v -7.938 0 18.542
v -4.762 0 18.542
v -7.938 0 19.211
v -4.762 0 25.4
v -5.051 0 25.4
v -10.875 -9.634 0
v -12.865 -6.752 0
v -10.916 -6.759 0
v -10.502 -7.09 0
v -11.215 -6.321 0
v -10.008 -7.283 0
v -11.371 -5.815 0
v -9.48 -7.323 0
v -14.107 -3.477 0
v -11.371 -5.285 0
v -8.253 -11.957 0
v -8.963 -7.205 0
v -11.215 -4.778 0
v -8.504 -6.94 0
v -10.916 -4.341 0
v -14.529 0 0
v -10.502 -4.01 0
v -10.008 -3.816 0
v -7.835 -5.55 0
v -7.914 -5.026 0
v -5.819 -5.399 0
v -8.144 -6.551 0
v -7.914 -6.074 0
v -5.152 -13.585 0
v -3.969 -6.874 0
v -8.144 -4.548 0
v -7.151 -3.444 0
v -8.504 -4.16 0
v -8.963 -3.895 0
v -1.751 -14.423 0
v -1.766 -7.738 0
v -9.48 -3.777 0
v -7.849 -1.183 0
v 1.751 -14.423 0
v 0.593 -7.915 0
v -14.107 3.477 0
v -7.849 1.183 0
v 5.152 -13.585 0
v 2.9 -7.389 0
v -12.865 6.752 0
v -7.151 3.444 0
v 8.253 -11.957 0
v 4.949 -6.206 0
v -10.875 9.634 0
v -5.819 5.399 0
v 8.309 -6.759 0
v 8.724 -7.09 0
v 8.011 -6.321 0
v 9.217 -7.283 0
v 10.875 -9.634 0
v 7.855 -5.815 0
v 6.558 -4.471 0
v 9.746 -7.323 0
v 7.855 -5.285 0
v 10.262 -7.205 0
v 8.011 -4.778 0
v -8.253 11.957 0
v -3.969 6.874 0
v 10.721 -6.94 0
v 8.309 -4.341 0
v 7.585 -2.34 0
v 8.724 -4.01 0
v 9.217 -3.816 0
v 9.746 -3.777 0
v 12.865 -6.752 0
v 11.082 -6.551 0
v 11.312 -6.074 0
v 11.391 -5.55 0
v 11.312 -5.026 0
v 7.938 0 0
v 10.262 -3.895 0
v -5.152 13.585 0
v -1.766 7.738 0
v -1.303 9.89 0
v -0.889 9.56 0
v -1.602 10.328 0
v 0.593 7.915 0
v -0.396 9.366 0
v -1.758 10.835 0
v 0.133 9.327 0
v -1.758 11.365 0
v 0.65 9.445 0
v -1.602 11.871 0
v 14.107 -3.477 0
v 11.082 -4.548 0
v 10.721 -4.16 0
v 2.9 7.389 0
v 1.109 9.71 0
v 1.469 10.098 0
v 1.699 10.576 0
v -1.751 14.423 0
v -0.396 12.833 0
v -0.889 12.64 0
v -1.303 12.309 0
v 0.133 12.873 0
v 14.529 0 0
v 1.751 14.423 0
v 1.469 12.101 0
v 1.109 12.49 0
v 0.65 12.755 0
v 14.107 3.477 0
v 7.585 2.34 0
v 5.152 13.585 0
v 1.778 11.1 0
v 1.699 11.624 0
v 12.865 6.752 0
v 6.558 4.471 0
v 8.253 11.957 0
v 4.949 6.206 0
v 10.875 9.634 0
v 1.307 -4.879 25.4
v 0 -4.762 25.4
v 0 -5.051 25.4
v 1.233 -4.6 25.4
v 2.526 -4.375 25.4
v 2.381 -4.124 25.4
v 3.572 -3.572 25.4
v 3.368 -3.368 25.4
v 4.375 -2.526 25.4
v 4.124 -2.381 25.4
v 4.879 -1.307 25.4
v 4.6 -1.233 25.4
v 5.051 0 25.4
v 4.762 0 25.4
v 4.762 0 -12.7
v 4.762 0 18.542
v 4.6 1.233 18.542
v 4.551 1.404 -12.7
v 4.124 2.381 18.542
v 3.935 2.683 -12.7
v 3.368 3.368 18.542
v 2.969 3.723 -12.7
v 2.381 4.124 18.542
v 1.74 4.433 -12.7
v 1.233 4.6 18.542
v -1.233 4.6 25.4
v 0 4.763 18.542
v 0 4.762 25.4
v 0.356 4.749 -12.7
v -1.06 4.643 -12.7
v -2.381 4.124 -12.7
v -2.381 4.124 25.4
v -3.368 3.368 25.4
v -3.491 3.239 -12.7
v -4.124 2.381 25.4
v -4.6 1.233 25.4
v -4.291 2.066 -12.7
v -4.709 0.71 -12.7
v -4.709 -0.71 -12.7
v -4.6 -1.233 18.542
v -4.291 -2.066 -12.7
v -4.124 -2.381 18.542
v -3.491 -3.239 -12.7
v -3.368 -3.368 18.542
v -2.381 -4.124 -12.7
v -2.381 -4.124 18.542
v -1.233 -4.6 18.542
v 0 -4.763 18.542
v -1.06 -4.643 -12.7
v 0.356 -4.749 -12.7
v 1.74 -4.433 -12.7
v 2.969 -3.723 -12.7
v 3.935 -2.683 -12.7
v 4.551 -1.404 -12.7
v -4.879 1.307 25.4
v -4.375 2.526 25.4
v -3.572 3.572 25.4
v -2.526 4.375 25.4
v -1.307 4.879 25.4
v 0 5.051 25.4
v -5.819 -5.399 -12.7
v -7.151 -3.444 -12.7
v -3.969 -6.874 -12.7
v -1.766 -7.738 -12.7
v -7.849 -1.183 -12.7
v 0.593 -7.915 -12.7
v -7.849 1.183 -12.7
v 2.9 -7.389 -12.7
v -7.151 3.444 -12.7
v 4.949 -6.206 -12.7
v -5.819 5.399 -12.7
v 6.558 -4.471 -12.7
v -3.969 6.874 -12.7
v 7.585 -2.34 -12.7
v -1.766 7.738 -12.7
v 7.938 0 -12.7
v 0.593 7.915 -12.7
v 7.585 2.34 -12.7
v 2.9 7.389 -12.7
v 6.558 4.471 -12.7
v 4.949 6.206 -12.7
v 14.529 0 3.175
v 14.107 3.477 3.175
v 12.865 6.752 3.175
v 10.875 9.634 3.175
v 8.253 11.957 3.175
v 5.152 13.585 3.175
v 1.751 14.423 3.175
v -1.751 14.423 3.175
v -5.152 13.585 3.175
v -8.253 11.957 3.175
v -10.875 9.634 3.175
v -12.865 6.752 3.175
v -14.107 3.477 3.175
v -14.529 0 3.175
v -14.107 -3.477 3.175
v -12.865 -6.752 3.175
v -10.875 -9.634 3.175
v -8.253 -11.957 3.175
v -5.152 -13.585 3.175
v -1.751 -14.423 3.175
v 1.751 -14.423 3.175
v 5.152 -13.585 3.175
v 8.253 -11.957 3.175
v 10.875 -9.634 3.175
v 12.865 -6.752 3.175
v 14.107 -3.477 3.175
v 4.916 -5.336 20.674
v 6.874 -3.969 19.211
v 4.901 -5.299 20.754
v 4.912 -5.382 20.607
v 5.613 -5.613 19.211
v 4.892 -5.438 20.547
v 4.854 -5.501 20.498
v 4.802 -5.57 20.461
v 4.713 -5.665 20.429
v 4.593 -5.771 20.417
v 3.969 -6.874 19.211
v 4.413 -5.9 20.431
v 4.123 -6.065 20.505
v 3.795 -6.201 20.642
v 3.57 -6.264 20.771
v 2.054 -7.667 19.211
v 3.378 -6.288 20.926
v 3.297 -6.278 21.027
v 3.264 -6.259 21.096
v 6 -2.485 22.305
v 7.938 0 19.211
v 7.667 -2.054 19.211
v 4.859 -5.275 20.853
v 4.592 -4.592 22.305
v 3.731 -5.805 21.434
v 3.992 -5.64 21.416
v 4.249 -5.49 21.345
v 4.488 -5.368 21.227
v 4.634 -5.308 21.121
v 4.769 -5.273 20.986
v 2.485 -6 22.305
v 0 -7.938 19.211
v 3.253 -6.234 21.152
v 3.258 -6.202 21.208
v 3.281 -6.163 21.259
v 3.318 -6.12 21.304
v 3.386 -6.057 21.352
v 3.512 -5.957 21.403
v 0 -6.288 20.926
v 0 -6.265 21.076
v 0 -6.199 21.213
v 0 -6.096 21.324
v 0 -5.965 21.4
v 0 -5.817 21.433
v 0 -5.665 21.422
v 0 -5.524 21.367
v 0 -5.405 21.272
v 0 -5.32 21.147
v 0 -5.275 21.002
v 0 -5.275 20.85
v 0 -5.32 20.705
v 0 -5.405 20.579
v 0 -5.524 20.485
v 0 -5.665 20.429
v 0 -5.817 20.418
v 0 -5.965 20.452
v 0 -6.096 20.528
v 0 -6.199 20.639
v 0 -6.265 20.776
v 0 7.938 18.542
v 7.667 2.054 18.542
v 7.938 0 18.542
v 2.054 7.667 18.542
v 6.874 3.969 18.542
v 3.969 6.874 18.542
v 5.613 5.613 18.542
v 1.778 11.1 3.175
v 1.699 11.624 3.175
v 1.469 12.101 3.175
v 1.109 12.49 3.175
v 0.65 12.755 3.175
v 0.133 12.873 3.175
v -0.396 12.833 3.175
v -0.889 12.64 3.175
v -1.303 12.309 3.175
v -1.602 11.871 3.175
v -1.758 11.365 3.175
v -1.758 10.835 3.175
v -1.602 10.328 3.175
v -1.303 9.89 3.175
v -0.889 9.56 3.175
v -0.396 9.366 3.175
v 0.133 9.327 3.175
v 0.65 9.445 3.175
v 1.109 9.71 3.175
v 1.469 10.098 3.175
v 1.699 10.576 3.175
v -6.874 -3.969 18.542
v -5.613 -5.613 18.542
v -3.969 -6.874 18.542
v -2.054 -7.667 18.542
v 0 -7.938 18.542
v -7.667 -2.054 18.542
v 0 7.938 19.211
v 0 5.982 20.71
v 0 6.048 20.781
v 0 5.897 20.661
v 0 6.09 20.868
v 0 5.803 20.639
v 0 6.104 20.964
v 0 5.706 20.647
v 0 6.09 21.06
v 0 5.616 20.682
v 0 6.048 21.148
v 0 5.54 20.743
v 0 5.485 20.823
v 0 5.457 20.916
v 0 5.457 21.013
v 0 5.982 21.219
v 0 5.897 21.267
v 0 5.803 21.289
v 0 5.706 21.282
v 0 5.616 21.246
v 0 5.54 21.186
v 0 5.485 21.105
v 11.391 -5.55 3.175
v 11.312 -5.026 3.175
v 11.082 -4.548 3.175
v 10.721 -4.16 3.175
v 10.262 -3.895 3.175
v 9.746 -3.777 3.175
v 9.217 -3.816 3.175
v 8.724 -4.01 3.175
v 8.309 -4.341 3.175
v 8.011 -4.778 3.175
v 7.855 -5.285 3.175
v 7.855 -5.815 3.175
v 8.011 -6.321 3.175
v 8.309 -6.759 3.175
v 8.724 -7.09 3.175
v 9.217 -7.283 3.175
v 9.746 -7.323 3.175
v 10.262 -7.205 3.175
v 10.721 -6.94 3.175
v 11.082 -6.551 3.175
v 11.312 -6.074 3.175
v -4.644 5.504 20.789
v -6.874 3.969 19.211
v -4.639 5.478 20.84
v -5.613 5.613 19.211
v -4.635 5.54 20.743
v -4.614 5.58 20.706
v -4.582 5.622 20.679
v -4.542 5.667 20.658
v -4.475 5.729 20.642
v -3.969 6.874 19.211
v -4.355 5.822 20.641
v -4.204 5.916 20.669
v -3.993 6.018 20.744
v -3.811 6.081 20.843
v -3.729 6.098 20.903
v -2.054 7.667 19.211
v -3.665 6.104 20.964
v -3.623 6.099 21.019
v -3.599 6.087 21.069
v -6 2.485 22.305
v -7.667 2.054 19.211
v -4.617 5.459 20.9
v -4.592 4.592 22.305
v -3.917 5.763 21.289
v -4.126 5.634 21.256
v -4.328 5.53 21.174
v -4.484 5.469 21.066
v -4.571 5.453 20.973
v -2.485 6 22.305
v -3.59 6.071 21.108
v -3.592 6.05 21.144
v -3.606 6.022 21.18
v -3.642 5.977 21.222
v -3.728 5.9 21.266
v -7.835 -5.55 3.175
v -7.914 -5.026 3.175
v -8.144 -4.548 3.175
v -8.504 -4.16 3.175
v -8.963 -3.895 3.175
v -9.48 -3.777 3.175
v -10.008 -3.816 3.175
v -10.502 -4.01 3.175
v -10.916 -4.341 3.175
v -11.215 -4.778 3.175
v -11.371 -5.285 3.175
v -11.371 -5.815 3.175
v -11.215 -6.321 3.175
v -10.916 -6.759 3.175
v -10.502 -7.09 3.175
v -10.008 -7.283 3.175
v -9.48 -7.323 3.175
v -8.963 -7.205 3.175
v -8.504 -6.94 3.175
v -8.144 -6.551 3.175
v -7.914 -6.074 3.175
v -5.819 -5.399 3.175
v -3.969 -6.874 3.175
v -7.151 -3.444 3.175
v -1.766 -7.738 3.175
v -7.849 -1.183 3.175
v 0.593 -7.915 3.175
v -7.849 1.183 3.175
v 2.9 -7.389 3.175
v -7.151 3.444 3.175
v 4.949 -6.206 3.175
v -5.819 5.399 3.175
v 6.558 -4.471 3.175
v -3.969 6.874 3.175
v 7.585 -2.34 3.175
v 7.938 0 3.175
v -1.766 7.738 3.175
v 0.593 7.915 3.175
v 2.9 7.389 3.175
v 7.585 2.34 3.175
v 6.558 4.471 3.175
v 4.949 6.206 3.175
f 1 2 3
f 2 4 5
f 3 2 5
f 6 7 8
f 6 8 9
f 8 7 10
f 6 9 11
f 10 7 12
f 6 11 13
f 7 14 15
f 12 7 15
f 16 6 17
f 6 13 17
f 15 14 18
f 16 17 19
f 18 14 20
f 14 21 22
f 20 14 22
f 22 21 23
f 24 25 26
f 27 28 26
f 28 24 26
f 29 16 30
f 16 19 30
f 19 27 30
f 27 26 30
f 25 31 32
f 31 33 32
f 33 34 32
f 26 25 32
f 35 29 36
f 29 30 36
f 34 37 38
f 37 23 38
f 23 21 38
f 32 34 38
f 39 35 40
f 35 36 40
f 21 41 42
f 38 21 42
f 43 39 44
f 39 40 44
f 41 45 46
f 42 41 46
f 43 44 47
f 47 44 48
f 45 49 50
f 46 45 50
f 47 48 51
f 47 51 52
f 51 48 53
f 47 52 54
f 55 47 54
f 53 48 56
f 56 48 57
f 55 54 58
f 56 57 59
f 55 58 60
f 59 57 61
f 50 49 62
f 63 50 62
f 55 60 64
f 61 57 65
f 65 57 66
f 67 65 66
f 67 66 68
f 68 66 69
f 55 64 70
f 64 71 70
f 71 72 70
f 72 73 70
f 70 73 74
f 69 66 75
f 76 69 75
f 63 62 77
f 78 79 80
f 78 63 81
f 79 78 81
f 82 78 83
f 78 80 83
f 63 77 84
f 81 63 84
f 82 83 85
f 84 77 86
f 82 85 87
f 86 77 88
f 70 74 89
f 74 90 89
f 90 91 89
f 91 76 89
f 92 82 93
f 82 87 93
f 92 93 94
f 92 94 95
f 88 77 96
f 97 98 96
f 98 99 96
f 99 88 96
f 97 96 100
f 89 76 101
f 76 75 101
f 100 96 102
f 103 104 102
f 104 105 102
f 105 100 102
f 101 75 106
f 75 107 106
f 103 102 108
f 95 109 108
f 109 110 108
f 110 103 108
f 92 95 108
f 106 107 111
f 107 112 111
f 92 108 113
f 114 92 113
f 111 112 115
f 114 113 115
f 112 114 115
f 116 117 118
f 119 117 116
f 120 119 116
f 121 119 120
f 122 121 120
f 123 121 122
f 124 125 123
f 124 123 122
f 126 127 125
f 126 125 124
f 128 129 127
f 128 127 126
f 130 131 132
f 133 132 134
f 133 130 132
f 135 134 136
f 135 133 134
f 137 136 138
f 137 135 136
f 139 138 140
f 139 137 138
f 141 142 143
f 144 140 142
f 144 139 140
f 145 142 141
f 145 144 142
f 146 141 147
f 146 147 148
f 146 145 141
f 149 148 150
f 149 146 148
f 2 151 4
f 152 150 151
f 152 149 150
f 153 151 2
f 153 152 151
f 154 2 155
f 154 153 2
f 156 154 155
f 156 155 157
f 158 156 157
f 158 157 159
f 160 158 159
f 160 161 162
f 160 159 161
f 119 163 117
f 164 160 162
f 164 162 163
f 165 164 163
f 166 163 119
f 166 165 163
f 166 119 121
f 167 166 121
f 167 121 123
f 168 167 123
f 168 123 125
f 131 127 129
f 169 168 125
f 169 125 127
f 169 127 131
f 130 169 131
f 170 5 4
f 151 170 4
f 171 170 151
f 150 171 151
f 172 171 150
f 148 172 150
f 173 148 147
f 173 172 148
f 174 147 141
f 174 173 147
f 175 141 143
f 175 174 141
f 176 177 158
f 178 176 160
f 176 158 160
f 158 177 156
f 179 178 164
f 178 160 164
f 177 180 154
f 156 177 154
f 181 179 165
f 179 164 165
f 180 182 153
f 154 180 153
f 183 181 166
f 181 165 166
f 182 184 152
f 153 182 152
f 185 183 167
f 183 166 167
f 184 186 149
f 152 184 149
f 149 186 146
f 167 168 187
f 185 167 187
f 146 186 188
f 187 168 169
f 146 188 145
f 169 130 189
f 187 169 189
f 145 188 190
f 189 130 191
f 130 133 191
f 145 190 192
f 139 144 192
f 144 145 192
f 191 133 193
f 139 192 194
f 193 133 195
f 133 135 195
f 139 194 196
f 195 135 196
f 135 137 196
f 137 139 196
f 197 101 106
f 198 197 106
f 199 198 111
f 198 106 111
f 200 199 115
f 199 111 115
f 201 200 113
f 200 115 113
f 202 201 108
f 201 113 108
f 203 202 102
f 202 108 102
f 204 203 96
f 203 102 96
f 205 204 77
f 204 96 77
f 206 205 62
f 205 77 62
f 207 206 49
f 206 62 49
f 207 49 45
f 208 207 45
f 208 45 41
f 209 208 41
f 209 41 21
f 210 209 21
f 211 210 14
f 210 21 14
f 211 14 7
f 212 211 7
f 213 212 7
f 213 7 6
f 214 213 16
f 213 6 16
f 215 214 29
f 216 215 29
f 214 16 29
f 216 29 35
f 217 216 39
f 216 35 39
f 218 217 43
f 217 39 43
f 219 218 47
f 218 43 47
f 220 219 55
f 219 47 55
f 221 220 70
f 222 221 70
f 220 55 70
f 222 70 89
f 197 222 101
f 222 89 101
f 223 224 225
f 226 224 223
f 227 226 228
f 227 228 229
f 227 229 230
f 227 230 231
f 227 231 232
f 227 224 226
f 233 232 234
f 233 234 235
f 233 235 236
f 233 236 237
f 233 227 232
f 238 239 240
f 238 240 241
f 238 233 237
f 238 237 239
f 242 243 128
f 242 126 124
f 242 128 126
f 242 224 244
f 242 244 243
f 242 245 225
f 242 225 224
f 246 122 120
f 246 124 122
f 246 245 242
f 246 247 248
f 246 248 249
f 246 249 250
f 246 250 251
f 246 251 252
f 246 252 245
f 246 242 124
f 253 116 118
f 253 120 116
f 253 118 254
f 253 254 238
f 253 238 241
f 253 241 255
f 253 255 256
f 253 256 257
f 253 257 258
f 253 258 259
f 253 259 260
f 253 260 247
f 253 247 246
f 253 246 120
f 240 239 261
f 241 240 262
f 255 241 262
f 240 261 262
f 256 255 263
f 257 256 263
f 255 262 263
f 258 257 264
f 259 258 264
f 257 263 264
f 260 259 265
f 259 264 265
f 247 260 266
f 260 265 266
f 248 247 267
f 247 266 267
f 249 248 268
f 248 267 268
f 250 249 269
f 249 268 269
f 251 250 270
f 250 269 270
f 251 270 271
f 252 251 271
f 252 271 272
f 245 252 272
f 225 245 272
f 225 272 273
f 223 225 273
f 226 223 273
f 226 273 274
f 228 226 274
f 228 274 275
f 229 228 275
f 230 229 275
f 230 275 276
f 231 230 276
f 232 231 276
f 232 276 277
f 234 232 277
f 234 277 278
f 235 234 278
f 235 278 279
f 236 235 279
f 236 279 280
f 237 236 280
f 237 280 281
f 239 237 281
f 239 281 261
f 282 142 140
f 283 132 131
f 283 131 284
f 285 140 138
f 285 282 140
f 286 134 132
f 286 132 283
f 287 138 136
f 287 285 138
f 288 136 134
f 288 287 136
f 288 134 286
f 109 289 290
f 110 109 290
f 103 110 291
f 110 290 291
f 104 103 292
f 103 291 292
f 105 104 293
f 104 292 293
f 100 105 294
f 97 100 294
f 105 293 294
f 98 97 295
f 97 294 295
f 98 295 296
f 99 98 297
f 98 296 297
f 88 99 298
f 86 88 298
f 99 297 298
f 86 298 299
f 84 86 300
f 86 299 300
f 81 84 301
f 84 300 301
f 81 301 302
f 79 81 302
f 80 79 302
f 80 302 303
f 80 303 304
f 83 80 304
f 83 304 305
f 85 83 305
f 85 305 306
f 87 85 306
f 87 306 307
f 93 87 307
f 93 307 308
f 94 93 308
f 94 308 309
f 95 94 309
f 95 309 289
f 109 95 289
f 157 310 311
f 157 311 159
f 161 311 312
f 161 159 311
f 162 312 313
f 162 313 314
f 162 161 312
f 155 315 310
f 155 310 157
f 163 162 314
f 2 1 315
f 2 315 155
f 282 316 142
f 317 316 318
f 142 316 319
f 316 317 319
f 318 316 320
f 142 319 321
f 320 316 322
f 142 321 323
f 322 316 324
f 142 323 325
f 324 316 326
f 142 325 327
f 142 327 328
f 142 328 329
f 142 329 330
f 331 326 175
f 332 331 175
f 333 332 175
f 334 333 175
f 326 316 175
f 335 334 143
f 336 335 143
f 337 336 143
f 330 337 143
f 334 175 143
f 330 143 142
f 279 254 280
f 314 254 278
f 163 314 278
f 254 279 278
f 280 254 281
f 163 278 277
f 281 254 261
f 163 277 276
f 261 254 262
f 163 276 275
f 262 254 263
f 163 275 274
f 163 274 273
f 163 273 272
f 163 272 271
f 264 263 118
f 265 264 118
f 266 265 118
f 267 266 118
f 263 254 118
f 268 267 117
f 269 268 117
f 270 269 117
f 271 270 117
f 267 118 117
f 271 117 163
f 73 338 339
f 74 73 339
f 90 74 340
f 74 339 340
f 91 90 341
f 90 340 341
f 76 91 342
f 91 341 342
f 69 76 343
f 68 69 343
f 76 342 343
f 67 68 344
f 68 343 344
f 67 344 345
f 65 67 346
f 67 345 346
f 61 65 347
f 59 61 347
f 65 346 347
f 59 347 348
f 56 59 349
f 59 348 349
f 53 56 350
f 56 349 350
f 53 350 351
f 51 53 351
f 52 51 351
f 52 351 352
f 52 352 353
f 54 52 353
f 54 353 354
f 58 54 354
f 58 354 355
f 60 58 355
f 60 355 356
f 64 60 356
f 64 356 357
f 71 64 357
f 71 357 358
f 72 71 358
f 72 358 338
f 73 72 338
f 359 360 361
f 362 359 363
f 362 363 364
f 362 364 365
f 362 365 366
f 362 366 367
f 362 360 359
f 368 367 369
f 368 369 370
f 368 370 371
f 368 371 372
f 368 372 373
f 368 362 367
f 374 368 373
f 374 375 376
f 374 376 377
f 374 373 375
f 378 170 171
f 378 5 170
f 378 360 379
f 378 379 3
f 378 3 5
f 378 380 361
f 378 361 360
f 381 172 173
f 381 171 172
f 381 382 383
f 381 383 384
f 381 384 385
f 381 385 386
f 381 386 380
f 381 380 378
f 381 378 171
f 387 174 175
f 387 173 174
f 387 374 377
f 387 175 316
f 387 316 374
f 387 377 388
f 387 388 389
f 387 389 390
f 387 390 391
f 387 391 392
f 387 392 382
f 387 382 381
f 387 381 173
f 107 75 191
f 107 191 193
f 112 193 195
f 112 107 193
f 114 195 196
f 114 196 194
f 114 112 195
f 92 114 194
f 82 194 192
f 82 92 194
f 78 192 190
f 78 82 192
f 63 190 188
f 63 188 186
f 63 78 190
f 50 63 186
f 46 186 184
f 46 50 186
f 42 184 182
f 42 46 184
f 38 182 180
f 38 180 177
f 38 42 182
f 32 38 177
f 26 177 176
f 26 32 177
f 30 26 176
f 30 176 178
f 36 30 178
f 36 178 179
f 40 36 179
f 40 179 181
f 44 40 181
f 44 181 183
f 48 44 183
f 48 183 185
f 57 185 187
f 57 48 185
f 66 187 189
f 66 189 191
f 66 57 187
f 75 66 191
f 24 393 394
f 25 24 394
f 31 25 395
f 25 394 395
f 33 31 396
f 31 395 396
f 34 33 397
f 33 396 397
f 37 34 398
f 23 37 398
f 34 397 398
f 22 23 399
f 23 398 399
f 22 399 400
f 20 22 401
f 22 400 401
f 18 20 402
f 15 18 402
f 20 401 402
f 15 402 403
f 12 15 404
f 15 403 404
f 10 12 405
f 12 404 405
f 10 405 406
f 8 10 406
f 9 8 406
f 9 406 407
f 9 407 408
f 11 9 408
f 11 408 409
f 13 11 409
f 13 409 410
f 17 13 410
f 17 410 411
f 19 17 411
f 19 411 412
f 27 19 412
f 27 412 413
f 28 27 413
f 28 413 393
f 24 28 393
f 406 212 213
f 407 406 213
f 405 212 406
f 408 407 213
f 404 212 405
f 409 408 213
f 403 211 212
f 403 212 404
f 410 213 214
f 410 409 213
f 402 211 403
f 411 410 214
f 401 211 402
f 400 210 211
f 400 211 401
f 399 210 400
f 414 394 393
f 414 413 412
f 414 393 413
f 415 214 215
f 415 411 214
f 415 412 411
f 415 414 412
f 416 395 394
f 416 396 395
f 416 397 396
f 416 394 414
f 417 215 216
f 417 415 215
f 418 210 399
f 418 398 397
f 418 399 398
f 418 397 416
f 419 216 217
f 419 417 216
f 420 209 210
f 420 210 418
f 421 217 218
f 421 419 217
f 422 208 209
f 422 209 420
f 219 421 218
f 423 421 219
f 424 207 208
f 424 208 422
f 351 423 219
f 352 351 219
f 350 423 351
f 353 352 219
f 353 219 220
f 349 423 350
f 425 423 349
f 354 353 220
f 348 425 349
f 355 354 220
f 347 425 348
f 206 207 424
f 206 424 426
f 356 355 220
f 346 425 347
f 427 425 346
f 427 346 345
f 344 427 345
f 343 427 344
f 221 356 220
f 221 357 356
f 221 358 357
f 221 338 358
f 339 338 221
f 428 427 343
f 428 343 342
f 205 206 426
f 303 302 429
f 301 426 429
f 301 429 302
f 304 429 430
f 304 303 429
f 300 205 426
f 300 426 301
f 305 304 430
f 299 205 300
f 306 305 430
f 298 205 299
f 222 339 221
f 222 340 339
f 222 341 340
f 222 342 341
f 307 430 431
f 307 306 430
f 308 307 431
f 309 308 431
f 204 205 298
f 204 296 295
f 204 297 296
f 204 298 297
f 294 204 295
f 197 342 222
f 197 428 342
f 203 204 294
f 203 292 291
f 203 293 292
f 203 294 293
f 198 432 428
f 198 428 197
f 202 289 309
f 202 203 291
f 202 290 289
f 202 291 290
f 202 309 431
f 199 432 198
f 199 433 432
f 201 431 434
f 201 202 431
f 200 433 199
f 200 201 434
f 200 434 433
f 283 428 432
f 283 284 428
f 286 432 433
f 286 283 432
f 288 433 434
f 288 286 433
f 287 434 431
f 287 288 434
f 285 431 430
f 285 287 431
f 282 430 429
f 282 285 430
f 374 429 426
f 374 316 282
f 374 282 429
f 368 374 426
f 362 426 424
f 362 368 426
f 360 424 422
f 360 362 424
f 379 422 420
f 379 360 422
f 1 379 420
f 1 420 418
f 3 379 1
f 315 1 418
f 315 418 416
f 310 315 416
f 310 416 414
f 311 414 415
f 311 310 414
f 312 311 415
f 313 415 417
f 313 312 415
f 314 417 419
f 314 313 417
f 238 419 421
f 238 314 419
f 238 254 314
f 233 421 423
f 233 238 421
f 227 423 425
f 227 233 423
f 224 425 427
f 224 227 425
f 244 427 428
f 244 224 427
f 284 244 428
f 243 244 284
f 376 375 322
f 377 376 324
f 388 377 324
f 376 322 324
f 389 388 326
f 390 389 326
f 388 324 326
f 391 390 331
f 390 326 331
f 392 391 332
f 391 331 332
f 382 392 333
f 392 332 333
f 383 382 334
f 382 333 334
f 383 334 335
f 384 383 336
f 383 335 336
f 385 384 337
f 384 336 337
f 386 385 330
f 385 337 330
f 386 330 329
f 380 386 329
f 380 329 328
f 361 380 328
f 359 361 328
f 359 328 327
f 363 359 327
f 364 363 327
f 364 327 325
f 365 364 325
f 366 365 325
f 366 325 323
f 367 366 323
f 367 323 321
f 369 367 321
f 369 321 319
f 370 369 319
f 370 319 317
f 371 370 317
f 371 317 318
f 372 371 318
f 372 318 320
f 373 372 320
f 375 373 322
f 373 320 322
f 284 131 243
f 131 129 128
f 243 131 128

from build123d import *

# Parameters (mm, degrees)
F0_R          = 7.9375
F0_R_2        = 4.7625
F1_DEPTH      = 25.4
F1_DEPTH_BACK = 12.7
F3_DEPTH      = 6.858
F4_R          = 11.421726494
F4_R_2        = 5.0513257944
F5_DEPTH      = 7.8232
F5_TAPER      = 25
F6_R          = 14.5288
F6_R_2        = 4.7625
F7_DEPTH      = 3.175
F8_R          = 1.778
F9_DEPTH      = 15.876
F10_R         = 0.325628867
F11_DEPTH     = 25.4
F12_R         = 0.5092148408
F13_DEPTH     = 25.4


with BuildPart() as f1:
    # F0 (on Top) → F1 (new body, two sides)
    with BuildSketch(Plane.XY) as f1_sk:
        Circle(F0_R)
        Circle(F0_R_2, mode=Mode.SUBTRACT)
    extrude(amount=F1_DEPTH)
    extrude(f1_sk.sketch, amount=-F1_DEPTH_BACK)

    # F2 (on face) → F3 (cut)
    with BuildSketch(Plane.XY.offset(25.4)):
        with BuildLine():
            Line((-2.6014847011, 0), (-10.5939569366, 0))
            ThreePointArc((-10.5939569366, 0), (-7.4910587894, -7.4910587894), (0, -10.5939569366))
            Line((0, -10.5939569366), (0, -2.6014847011))
            ThreePointArc((0, -2.6014847011), (-1.8395274733, -1.8395274733), (-2.6014847011, 0))
        make_face()
        with BuildLine():
            ThreePointArc((0, 2.6014847011), (1.8395274733, 1.8395274733), (2.6014847011, 0))
            Line((2.6014847011, 0), (10.5939569366, 0))
            ThreePointArc((10.5939569366, 0), (7.4910587894, 7.4910587894), (0, 10.5939569366))
            Line((0, 10.5939569366), (0, 2.6014847011))
        make_face()
    extrude(amount=-F3_DEPTH, mode=Mode.SUBTRACT)

    # F4 (on face) → F5 (cut)
    with BuildSketch(Plane.XY.offset(25.4)):
        Circle(F4_R)
        Circle(F4_R_2, mode=Mode.SUBTRACT)
    extrude(amount=-F5_DEPTH, taper=F5_TAPER, mode=Mode.SUBTRACT)

    # F6 (on Top) → F7 (join)
    with BuildSketch(Plane.XY):
        Circle(F6_R)
        Circle(F6_R_2, mode=Mode.SUBTRACT)
    extrude(amount=F7_DEPTH)

    # F8 (on face) → F9 (cut, through all)
    with BuildSketch(Plane.XY.offset(3.175)):
        with Locations((0, 11.0998)):
            Circle(F8_R)
        with Locations((9.6127087769, -5.5499)):
            Circle(F8_R)
        with Locations((-9.6127087769, -5.5499)):
            Circle(F8_R)
    extrude(amount=-F9_DEPTH, mode=Mode.SUBTRACT)

    # F10 (on face) → F11 (cut)
    with BuildSketch(Plane.YZ):
        with Locations((5.7785, 20.9641065449)):
            Circle(F10_R)
    extrude(amount=-F11_DEPTH, mode=Mode.SUBTRACT)

    # F12 (on face) → F13 (cut)
    with BuildSketch(Plane(origin=(0, 0, 0), x_dir=(0, -1, 0), z_dir=(-1, 0, 0))):
        with Locations((5.7785, 20.9257006645)):
            Circle(F12_R)
    extrude(amount=-F13_DEPTH, mode=Mode.SUBTRACT)


solid = f1.part
